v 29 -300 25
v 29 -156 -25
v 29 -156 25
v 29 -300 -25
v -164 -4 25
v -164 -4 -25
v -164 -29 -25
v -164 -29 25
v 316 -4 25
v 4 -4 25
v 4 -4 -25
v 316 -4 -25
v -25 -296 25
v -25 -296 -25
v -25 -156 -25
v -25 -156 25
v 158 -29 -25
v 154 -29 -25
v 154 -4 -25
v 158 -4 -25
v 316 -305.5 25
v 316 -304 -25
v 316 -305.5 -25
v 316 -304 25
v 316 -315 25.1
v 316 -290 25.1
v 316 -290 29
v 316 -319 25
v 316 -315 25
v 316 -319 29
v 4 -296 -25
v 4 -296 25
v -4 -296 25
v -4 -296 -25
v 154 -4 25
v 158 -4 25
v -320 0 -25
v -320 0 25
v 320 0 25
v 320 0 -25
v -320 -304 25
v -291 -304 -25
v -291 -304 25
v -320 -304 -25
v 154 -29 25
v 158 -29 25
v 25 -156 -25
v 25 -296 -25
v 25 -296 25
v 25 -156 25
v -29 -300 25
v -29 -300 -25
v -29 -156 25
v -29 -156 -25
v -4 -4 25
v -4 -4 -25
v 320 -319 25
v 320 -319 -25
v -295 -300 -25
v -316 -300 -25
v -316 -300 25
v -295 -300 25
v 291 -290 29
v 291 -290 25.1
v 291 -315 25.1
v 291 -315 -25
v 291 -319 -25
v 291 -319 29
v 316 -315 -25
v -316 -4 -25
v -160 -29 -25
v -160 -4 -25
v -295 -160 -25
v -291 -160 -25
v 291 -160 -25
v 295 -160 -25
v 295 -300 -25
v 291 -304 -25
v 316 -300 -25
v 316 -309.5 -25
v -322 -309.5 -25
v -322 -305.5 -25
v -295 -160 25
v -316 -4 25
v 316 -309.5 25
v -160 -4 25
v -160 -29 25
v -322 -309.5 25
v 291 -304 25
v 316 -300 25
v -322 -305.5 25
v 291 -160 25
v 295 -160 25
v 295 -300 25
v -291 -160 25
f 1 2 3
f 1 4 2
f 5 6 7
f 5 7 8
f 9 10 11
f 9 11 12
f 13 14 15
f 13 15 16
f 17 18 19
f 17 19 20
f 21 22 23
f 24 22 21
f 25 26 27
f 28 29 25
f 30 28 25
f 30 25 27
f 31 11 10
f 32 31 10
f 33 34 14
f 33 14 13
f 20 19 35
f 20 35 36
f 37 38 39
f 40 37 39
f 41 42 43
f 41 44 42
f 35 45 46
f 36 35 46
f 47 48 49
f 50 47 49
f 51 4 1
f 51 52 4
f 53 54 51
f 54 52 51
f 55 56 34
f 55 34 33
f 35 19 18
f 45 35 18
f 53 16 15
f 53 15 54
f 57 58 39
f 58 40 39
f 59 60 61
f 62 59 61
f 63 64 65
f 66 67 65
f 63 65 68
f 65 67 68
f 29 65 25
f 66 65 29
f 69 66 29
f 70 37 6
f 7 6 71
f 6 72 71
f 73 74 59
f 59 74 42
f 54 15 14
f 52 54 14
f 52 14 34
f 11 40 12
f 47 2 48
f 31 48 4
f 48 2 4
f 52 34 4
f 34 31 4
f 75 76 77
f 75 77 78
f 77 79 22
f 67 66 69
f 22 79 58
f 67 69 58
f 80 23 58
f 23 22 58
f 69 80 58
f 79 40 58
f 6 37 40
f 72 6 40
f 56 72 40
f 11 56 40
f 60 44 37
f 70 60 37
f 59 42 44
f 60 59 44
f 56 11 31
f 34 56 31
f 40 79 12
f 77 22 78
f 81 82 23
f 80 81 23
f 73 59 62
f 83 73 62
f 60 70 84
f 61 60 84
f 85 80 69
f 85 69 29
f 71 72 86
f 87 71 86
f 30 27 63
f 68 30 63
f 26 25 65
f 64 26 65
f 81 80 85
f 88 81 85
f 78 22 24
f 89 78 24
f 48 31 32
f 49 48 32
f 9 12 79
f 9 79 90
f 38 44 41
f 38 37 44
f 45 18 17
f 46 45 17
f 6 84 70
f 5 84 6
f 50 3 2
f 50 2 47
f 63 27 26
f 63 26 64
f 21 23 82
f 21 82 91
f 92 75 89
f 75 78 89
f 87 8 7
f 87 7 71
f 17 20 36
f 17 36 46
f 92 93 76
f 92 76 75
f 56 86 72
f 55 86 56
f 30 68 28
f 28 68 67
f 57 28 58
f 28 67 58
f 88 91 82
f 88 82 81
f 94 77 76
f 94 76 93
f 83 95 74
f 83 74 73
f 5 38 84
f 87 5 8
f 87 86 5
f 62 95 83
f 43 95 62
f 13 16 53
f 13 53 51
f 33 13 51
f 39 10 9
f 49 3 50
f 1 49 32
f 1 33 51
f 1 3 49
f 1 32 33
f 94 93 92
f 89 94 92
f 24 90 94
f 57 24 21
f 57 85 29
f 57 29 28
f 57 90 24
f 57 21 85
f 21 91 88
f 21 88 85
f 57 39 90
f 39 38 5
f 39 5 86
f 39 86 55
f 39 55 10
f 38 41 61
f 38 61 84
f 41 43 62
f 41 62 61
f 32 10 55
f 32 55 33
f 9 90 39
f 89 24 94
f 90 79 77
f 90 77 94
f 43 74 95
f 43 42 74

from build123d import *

# Parameters (mm, degrees)
F0_W      = 640
F0_H      = 50
F1_DEPTH  = 4
F2_W      = 4
F2_H      = 50
F3_DEPTH  = 300
F4_W      = 4
F4_H      = 50
F5_DEPTH  = 300
F6_W      = 4
F6_H      = 50
F7_DEPTH  = 25
F8_W      = 4
F8_H      = 50
F9_DEPTH  = 25
F10_W     = 8
F10_H     = 50
F11_DEPTH = 300
F12_W     = 4
F12_H     = 50
F13_DEPTH = 25
F14_W     = 4
F14_H     = 50
F15_DEPTH = 25
F16_W     = 4
F16_H     = 50
F17_DEPTH = 140
F18_W     = 4
F18_H     = 50
F19_DEPTH = 140
F22_W     = 4
F22_H     = 50
F23_DEPTH = 25
F24_W     = 4
F24_H     = 50
F25_DEPTH = 140
F26_W     = 4
F26_H     = 50
F27_DEPTH = 140
F28_W     = 4
F28_H     = 25
F29_DEPTH = 50
F31_W     = 4
F31_H     = 50
F32_DEPTH = 15
F33_W     = 4
F33_H     = 50
F34_DEPTH = 25
F35_W     = 25
F35_H     = 4
F36_DEPTH = 4
F37_W     = 25
F37_H     = 3.9
F38_DEPTH = 25
F39_W     = 4
F39_H     = 50
F40_DEPTH = 638


# Not quite as in the source:
# - a feature of the source that left no trace in its solid (it failed there, or was rolled back) is left out
# - the program builds the solid bodies; features that only make, move or delete a surface that nothing else refers to are left out


with BuildPart() as f1:
    # F0 (on Front) → F1 (new body)
    with BuildSketch(Plane.XZ):
        Rectangle(F0_W, F0_H)
    extrude(amount=F1_DEPTH)

    # F2 (on face) → F3 (join)
    with BuildSketch(Plane.XZ.offset(4)):
        with Locations((-318, 0)):
            Rectangle(F2_W, F2_H)
    extrude(amount=F3_DEPTH)

    # F4 (on face) → F5 (join)
    with BuildSketch(Plane.XZ.offset(4)):
        with Locations((318, 0)):
            Rectangle(F4_W, F4_H)
    extrude(amount=F5_DEPTH)

    # F6 (on face) → F7 (join)
    with BuildSketch(Plane.YZ.offset(-316)):
        with Locations((-302, 0)):
            Rectangle(F6_W, F6_H)
    extrude(amount=F7_DEPTH)

    # F8 (on face) → F9 (join)
    with BuildSketch(Plane(origin=(316, 0, 0), x_dir=(0, -1, 0), z_dir=(-1, 0, 0))):
        with Locations((302, 0)):
            Rectangle(F8_W, F8_H)
    extrude(amount=F9_DEPTH)

    # F10 (on Front) → F11 (join)
    with BuildSketch(Plane.XZ):
        Rectangle(F10_W, F10_H)
    extrude(amount=F11_DEPTH)

    # F12 (on face) → F13 (join)
    with BuildSketch(Plane.XZ.offset(4)):
        with Locations((-162, 0)):
            Rectangle(F12_W, F12_H)
    extrude(amount=F13_DEPTH)

    # F14 (on face) → F15 (join)
    with BuildSketch(Plane(origin=(-4, 0, 0), x_dir=(0, -1, 0), z_dir=(-1, 0, 0))):
        with Locations((298, 0)):
            Rectangle(F14_W, F14_H)
    extrude(amount=F15_DEPTH)

    # F16 (on face) → F17 (join)
    with BuildSketch(Plane(origin=(0, -300, 0), x_dir=(-1, 0, 0), z_dir=(0, 1, 0))):
        with Locations((293, 0)):
            Rectangle(F16_W, F16_H)
    extrude(amount=F17_DEPTH)

    # F18 (on face) → F19 (join)
    with BuildSketch(Plane(origin=(0, -296, 0), x_dir=(-1, 0, 0), z_dir=(0, 1, 0))):
        with Locations((27, 0)):
            Rectangle(F18_W, F18_H)
    extrude(amount=F19_DEPTH)

    # F22 (on face) → F23 (join)
    with BuildSketch(Plane.YZ.offset(4)):
        with Locations((-298, 0)):
            Rectangle(F22_W, F22_H)
    extrude(amount=F23_DEPTH)

    # F24 (on face) → F25 (join)
    with BuildSketch(Plane(origin=(0, -296, 0), x_dir=(-1, 0, 0), z_dir=(0, 1, 0))):
        with Locations((-27, 0)):
            Rectangle(F24_W, F24_H)
    extrude(amount=F25_DEPTH)

    # F26 (on face) → F27 (join)
    with BuildSketch(Plane(origin=(0, -300, 0), x_dir=(-1, 0, 0), z_dir=(0, 1, 0))):
        with Locations((-293, 0)):
            Rectangle(F26_W, F26_H)
    extrude(amount=F27_DEPTH)

    # F31 (on face) → F32 (join)
    with BuildSketch(Plane.XZ.offset(304)):
        with Locations((318, 0)):
            Rectangle(F31_W, F31_H)
    extrude(amount=F32_DEPTH)

    # F33 (on face) → F34 (join)
    with BuildSketch(Plane(origin=(316, 0, 0), x_dir=(0, -1, 0), z_dir=(-1, 0, 0))):
        with Locations((317, 0)):
            Rectangle(F33_W, F33_H)
    extrude(amount=F34_DEPTH)

    # F35 (on face) → F36 (join)
    with BuildSketch(Plane.XY.offset(25)):
        with Locations((303.5, -317)):
            Rectangle(F35_W, F35_H)
    extrude(amount=F36_DEPTH)

    # F37 (on face) → F38 (join)
    with BuildSketch(Plane(origin=(0, -315, 0), x_dir=(-1, 0, 0), z_dir=(0, 1, 0))):
        with Locations((-303.5, 27.05)):
            Rectangle(F37_W, F37_H)
    extrude(amount=F38_DEPTH)

    # F39 (on face) → F40 (join)
    with BuildSketch(Plane(origin=(316, 0, 0), x_dir=(0, -1, 0), z_dir=(-1, 0, 0))):
        with Locations((307.5, 0)):
            Rectangle(F39_W, F39_H)
    extrude(amount=F40_DEPTH)


with BuildPart() as f29:
    # F28 (on face) → F29 (new body)
    with BuildSketch(Plane(origin=(0, 0, -25), x_dir=(1, 0, 0), z_dir=(0, 0, -1))):
        with Locations((156, 16.5)):
            Rectangle(F28_W, F28_H)
    extrude(amount=-F29_DEPTH)


solid = Compound([f1.part, f29.part])
